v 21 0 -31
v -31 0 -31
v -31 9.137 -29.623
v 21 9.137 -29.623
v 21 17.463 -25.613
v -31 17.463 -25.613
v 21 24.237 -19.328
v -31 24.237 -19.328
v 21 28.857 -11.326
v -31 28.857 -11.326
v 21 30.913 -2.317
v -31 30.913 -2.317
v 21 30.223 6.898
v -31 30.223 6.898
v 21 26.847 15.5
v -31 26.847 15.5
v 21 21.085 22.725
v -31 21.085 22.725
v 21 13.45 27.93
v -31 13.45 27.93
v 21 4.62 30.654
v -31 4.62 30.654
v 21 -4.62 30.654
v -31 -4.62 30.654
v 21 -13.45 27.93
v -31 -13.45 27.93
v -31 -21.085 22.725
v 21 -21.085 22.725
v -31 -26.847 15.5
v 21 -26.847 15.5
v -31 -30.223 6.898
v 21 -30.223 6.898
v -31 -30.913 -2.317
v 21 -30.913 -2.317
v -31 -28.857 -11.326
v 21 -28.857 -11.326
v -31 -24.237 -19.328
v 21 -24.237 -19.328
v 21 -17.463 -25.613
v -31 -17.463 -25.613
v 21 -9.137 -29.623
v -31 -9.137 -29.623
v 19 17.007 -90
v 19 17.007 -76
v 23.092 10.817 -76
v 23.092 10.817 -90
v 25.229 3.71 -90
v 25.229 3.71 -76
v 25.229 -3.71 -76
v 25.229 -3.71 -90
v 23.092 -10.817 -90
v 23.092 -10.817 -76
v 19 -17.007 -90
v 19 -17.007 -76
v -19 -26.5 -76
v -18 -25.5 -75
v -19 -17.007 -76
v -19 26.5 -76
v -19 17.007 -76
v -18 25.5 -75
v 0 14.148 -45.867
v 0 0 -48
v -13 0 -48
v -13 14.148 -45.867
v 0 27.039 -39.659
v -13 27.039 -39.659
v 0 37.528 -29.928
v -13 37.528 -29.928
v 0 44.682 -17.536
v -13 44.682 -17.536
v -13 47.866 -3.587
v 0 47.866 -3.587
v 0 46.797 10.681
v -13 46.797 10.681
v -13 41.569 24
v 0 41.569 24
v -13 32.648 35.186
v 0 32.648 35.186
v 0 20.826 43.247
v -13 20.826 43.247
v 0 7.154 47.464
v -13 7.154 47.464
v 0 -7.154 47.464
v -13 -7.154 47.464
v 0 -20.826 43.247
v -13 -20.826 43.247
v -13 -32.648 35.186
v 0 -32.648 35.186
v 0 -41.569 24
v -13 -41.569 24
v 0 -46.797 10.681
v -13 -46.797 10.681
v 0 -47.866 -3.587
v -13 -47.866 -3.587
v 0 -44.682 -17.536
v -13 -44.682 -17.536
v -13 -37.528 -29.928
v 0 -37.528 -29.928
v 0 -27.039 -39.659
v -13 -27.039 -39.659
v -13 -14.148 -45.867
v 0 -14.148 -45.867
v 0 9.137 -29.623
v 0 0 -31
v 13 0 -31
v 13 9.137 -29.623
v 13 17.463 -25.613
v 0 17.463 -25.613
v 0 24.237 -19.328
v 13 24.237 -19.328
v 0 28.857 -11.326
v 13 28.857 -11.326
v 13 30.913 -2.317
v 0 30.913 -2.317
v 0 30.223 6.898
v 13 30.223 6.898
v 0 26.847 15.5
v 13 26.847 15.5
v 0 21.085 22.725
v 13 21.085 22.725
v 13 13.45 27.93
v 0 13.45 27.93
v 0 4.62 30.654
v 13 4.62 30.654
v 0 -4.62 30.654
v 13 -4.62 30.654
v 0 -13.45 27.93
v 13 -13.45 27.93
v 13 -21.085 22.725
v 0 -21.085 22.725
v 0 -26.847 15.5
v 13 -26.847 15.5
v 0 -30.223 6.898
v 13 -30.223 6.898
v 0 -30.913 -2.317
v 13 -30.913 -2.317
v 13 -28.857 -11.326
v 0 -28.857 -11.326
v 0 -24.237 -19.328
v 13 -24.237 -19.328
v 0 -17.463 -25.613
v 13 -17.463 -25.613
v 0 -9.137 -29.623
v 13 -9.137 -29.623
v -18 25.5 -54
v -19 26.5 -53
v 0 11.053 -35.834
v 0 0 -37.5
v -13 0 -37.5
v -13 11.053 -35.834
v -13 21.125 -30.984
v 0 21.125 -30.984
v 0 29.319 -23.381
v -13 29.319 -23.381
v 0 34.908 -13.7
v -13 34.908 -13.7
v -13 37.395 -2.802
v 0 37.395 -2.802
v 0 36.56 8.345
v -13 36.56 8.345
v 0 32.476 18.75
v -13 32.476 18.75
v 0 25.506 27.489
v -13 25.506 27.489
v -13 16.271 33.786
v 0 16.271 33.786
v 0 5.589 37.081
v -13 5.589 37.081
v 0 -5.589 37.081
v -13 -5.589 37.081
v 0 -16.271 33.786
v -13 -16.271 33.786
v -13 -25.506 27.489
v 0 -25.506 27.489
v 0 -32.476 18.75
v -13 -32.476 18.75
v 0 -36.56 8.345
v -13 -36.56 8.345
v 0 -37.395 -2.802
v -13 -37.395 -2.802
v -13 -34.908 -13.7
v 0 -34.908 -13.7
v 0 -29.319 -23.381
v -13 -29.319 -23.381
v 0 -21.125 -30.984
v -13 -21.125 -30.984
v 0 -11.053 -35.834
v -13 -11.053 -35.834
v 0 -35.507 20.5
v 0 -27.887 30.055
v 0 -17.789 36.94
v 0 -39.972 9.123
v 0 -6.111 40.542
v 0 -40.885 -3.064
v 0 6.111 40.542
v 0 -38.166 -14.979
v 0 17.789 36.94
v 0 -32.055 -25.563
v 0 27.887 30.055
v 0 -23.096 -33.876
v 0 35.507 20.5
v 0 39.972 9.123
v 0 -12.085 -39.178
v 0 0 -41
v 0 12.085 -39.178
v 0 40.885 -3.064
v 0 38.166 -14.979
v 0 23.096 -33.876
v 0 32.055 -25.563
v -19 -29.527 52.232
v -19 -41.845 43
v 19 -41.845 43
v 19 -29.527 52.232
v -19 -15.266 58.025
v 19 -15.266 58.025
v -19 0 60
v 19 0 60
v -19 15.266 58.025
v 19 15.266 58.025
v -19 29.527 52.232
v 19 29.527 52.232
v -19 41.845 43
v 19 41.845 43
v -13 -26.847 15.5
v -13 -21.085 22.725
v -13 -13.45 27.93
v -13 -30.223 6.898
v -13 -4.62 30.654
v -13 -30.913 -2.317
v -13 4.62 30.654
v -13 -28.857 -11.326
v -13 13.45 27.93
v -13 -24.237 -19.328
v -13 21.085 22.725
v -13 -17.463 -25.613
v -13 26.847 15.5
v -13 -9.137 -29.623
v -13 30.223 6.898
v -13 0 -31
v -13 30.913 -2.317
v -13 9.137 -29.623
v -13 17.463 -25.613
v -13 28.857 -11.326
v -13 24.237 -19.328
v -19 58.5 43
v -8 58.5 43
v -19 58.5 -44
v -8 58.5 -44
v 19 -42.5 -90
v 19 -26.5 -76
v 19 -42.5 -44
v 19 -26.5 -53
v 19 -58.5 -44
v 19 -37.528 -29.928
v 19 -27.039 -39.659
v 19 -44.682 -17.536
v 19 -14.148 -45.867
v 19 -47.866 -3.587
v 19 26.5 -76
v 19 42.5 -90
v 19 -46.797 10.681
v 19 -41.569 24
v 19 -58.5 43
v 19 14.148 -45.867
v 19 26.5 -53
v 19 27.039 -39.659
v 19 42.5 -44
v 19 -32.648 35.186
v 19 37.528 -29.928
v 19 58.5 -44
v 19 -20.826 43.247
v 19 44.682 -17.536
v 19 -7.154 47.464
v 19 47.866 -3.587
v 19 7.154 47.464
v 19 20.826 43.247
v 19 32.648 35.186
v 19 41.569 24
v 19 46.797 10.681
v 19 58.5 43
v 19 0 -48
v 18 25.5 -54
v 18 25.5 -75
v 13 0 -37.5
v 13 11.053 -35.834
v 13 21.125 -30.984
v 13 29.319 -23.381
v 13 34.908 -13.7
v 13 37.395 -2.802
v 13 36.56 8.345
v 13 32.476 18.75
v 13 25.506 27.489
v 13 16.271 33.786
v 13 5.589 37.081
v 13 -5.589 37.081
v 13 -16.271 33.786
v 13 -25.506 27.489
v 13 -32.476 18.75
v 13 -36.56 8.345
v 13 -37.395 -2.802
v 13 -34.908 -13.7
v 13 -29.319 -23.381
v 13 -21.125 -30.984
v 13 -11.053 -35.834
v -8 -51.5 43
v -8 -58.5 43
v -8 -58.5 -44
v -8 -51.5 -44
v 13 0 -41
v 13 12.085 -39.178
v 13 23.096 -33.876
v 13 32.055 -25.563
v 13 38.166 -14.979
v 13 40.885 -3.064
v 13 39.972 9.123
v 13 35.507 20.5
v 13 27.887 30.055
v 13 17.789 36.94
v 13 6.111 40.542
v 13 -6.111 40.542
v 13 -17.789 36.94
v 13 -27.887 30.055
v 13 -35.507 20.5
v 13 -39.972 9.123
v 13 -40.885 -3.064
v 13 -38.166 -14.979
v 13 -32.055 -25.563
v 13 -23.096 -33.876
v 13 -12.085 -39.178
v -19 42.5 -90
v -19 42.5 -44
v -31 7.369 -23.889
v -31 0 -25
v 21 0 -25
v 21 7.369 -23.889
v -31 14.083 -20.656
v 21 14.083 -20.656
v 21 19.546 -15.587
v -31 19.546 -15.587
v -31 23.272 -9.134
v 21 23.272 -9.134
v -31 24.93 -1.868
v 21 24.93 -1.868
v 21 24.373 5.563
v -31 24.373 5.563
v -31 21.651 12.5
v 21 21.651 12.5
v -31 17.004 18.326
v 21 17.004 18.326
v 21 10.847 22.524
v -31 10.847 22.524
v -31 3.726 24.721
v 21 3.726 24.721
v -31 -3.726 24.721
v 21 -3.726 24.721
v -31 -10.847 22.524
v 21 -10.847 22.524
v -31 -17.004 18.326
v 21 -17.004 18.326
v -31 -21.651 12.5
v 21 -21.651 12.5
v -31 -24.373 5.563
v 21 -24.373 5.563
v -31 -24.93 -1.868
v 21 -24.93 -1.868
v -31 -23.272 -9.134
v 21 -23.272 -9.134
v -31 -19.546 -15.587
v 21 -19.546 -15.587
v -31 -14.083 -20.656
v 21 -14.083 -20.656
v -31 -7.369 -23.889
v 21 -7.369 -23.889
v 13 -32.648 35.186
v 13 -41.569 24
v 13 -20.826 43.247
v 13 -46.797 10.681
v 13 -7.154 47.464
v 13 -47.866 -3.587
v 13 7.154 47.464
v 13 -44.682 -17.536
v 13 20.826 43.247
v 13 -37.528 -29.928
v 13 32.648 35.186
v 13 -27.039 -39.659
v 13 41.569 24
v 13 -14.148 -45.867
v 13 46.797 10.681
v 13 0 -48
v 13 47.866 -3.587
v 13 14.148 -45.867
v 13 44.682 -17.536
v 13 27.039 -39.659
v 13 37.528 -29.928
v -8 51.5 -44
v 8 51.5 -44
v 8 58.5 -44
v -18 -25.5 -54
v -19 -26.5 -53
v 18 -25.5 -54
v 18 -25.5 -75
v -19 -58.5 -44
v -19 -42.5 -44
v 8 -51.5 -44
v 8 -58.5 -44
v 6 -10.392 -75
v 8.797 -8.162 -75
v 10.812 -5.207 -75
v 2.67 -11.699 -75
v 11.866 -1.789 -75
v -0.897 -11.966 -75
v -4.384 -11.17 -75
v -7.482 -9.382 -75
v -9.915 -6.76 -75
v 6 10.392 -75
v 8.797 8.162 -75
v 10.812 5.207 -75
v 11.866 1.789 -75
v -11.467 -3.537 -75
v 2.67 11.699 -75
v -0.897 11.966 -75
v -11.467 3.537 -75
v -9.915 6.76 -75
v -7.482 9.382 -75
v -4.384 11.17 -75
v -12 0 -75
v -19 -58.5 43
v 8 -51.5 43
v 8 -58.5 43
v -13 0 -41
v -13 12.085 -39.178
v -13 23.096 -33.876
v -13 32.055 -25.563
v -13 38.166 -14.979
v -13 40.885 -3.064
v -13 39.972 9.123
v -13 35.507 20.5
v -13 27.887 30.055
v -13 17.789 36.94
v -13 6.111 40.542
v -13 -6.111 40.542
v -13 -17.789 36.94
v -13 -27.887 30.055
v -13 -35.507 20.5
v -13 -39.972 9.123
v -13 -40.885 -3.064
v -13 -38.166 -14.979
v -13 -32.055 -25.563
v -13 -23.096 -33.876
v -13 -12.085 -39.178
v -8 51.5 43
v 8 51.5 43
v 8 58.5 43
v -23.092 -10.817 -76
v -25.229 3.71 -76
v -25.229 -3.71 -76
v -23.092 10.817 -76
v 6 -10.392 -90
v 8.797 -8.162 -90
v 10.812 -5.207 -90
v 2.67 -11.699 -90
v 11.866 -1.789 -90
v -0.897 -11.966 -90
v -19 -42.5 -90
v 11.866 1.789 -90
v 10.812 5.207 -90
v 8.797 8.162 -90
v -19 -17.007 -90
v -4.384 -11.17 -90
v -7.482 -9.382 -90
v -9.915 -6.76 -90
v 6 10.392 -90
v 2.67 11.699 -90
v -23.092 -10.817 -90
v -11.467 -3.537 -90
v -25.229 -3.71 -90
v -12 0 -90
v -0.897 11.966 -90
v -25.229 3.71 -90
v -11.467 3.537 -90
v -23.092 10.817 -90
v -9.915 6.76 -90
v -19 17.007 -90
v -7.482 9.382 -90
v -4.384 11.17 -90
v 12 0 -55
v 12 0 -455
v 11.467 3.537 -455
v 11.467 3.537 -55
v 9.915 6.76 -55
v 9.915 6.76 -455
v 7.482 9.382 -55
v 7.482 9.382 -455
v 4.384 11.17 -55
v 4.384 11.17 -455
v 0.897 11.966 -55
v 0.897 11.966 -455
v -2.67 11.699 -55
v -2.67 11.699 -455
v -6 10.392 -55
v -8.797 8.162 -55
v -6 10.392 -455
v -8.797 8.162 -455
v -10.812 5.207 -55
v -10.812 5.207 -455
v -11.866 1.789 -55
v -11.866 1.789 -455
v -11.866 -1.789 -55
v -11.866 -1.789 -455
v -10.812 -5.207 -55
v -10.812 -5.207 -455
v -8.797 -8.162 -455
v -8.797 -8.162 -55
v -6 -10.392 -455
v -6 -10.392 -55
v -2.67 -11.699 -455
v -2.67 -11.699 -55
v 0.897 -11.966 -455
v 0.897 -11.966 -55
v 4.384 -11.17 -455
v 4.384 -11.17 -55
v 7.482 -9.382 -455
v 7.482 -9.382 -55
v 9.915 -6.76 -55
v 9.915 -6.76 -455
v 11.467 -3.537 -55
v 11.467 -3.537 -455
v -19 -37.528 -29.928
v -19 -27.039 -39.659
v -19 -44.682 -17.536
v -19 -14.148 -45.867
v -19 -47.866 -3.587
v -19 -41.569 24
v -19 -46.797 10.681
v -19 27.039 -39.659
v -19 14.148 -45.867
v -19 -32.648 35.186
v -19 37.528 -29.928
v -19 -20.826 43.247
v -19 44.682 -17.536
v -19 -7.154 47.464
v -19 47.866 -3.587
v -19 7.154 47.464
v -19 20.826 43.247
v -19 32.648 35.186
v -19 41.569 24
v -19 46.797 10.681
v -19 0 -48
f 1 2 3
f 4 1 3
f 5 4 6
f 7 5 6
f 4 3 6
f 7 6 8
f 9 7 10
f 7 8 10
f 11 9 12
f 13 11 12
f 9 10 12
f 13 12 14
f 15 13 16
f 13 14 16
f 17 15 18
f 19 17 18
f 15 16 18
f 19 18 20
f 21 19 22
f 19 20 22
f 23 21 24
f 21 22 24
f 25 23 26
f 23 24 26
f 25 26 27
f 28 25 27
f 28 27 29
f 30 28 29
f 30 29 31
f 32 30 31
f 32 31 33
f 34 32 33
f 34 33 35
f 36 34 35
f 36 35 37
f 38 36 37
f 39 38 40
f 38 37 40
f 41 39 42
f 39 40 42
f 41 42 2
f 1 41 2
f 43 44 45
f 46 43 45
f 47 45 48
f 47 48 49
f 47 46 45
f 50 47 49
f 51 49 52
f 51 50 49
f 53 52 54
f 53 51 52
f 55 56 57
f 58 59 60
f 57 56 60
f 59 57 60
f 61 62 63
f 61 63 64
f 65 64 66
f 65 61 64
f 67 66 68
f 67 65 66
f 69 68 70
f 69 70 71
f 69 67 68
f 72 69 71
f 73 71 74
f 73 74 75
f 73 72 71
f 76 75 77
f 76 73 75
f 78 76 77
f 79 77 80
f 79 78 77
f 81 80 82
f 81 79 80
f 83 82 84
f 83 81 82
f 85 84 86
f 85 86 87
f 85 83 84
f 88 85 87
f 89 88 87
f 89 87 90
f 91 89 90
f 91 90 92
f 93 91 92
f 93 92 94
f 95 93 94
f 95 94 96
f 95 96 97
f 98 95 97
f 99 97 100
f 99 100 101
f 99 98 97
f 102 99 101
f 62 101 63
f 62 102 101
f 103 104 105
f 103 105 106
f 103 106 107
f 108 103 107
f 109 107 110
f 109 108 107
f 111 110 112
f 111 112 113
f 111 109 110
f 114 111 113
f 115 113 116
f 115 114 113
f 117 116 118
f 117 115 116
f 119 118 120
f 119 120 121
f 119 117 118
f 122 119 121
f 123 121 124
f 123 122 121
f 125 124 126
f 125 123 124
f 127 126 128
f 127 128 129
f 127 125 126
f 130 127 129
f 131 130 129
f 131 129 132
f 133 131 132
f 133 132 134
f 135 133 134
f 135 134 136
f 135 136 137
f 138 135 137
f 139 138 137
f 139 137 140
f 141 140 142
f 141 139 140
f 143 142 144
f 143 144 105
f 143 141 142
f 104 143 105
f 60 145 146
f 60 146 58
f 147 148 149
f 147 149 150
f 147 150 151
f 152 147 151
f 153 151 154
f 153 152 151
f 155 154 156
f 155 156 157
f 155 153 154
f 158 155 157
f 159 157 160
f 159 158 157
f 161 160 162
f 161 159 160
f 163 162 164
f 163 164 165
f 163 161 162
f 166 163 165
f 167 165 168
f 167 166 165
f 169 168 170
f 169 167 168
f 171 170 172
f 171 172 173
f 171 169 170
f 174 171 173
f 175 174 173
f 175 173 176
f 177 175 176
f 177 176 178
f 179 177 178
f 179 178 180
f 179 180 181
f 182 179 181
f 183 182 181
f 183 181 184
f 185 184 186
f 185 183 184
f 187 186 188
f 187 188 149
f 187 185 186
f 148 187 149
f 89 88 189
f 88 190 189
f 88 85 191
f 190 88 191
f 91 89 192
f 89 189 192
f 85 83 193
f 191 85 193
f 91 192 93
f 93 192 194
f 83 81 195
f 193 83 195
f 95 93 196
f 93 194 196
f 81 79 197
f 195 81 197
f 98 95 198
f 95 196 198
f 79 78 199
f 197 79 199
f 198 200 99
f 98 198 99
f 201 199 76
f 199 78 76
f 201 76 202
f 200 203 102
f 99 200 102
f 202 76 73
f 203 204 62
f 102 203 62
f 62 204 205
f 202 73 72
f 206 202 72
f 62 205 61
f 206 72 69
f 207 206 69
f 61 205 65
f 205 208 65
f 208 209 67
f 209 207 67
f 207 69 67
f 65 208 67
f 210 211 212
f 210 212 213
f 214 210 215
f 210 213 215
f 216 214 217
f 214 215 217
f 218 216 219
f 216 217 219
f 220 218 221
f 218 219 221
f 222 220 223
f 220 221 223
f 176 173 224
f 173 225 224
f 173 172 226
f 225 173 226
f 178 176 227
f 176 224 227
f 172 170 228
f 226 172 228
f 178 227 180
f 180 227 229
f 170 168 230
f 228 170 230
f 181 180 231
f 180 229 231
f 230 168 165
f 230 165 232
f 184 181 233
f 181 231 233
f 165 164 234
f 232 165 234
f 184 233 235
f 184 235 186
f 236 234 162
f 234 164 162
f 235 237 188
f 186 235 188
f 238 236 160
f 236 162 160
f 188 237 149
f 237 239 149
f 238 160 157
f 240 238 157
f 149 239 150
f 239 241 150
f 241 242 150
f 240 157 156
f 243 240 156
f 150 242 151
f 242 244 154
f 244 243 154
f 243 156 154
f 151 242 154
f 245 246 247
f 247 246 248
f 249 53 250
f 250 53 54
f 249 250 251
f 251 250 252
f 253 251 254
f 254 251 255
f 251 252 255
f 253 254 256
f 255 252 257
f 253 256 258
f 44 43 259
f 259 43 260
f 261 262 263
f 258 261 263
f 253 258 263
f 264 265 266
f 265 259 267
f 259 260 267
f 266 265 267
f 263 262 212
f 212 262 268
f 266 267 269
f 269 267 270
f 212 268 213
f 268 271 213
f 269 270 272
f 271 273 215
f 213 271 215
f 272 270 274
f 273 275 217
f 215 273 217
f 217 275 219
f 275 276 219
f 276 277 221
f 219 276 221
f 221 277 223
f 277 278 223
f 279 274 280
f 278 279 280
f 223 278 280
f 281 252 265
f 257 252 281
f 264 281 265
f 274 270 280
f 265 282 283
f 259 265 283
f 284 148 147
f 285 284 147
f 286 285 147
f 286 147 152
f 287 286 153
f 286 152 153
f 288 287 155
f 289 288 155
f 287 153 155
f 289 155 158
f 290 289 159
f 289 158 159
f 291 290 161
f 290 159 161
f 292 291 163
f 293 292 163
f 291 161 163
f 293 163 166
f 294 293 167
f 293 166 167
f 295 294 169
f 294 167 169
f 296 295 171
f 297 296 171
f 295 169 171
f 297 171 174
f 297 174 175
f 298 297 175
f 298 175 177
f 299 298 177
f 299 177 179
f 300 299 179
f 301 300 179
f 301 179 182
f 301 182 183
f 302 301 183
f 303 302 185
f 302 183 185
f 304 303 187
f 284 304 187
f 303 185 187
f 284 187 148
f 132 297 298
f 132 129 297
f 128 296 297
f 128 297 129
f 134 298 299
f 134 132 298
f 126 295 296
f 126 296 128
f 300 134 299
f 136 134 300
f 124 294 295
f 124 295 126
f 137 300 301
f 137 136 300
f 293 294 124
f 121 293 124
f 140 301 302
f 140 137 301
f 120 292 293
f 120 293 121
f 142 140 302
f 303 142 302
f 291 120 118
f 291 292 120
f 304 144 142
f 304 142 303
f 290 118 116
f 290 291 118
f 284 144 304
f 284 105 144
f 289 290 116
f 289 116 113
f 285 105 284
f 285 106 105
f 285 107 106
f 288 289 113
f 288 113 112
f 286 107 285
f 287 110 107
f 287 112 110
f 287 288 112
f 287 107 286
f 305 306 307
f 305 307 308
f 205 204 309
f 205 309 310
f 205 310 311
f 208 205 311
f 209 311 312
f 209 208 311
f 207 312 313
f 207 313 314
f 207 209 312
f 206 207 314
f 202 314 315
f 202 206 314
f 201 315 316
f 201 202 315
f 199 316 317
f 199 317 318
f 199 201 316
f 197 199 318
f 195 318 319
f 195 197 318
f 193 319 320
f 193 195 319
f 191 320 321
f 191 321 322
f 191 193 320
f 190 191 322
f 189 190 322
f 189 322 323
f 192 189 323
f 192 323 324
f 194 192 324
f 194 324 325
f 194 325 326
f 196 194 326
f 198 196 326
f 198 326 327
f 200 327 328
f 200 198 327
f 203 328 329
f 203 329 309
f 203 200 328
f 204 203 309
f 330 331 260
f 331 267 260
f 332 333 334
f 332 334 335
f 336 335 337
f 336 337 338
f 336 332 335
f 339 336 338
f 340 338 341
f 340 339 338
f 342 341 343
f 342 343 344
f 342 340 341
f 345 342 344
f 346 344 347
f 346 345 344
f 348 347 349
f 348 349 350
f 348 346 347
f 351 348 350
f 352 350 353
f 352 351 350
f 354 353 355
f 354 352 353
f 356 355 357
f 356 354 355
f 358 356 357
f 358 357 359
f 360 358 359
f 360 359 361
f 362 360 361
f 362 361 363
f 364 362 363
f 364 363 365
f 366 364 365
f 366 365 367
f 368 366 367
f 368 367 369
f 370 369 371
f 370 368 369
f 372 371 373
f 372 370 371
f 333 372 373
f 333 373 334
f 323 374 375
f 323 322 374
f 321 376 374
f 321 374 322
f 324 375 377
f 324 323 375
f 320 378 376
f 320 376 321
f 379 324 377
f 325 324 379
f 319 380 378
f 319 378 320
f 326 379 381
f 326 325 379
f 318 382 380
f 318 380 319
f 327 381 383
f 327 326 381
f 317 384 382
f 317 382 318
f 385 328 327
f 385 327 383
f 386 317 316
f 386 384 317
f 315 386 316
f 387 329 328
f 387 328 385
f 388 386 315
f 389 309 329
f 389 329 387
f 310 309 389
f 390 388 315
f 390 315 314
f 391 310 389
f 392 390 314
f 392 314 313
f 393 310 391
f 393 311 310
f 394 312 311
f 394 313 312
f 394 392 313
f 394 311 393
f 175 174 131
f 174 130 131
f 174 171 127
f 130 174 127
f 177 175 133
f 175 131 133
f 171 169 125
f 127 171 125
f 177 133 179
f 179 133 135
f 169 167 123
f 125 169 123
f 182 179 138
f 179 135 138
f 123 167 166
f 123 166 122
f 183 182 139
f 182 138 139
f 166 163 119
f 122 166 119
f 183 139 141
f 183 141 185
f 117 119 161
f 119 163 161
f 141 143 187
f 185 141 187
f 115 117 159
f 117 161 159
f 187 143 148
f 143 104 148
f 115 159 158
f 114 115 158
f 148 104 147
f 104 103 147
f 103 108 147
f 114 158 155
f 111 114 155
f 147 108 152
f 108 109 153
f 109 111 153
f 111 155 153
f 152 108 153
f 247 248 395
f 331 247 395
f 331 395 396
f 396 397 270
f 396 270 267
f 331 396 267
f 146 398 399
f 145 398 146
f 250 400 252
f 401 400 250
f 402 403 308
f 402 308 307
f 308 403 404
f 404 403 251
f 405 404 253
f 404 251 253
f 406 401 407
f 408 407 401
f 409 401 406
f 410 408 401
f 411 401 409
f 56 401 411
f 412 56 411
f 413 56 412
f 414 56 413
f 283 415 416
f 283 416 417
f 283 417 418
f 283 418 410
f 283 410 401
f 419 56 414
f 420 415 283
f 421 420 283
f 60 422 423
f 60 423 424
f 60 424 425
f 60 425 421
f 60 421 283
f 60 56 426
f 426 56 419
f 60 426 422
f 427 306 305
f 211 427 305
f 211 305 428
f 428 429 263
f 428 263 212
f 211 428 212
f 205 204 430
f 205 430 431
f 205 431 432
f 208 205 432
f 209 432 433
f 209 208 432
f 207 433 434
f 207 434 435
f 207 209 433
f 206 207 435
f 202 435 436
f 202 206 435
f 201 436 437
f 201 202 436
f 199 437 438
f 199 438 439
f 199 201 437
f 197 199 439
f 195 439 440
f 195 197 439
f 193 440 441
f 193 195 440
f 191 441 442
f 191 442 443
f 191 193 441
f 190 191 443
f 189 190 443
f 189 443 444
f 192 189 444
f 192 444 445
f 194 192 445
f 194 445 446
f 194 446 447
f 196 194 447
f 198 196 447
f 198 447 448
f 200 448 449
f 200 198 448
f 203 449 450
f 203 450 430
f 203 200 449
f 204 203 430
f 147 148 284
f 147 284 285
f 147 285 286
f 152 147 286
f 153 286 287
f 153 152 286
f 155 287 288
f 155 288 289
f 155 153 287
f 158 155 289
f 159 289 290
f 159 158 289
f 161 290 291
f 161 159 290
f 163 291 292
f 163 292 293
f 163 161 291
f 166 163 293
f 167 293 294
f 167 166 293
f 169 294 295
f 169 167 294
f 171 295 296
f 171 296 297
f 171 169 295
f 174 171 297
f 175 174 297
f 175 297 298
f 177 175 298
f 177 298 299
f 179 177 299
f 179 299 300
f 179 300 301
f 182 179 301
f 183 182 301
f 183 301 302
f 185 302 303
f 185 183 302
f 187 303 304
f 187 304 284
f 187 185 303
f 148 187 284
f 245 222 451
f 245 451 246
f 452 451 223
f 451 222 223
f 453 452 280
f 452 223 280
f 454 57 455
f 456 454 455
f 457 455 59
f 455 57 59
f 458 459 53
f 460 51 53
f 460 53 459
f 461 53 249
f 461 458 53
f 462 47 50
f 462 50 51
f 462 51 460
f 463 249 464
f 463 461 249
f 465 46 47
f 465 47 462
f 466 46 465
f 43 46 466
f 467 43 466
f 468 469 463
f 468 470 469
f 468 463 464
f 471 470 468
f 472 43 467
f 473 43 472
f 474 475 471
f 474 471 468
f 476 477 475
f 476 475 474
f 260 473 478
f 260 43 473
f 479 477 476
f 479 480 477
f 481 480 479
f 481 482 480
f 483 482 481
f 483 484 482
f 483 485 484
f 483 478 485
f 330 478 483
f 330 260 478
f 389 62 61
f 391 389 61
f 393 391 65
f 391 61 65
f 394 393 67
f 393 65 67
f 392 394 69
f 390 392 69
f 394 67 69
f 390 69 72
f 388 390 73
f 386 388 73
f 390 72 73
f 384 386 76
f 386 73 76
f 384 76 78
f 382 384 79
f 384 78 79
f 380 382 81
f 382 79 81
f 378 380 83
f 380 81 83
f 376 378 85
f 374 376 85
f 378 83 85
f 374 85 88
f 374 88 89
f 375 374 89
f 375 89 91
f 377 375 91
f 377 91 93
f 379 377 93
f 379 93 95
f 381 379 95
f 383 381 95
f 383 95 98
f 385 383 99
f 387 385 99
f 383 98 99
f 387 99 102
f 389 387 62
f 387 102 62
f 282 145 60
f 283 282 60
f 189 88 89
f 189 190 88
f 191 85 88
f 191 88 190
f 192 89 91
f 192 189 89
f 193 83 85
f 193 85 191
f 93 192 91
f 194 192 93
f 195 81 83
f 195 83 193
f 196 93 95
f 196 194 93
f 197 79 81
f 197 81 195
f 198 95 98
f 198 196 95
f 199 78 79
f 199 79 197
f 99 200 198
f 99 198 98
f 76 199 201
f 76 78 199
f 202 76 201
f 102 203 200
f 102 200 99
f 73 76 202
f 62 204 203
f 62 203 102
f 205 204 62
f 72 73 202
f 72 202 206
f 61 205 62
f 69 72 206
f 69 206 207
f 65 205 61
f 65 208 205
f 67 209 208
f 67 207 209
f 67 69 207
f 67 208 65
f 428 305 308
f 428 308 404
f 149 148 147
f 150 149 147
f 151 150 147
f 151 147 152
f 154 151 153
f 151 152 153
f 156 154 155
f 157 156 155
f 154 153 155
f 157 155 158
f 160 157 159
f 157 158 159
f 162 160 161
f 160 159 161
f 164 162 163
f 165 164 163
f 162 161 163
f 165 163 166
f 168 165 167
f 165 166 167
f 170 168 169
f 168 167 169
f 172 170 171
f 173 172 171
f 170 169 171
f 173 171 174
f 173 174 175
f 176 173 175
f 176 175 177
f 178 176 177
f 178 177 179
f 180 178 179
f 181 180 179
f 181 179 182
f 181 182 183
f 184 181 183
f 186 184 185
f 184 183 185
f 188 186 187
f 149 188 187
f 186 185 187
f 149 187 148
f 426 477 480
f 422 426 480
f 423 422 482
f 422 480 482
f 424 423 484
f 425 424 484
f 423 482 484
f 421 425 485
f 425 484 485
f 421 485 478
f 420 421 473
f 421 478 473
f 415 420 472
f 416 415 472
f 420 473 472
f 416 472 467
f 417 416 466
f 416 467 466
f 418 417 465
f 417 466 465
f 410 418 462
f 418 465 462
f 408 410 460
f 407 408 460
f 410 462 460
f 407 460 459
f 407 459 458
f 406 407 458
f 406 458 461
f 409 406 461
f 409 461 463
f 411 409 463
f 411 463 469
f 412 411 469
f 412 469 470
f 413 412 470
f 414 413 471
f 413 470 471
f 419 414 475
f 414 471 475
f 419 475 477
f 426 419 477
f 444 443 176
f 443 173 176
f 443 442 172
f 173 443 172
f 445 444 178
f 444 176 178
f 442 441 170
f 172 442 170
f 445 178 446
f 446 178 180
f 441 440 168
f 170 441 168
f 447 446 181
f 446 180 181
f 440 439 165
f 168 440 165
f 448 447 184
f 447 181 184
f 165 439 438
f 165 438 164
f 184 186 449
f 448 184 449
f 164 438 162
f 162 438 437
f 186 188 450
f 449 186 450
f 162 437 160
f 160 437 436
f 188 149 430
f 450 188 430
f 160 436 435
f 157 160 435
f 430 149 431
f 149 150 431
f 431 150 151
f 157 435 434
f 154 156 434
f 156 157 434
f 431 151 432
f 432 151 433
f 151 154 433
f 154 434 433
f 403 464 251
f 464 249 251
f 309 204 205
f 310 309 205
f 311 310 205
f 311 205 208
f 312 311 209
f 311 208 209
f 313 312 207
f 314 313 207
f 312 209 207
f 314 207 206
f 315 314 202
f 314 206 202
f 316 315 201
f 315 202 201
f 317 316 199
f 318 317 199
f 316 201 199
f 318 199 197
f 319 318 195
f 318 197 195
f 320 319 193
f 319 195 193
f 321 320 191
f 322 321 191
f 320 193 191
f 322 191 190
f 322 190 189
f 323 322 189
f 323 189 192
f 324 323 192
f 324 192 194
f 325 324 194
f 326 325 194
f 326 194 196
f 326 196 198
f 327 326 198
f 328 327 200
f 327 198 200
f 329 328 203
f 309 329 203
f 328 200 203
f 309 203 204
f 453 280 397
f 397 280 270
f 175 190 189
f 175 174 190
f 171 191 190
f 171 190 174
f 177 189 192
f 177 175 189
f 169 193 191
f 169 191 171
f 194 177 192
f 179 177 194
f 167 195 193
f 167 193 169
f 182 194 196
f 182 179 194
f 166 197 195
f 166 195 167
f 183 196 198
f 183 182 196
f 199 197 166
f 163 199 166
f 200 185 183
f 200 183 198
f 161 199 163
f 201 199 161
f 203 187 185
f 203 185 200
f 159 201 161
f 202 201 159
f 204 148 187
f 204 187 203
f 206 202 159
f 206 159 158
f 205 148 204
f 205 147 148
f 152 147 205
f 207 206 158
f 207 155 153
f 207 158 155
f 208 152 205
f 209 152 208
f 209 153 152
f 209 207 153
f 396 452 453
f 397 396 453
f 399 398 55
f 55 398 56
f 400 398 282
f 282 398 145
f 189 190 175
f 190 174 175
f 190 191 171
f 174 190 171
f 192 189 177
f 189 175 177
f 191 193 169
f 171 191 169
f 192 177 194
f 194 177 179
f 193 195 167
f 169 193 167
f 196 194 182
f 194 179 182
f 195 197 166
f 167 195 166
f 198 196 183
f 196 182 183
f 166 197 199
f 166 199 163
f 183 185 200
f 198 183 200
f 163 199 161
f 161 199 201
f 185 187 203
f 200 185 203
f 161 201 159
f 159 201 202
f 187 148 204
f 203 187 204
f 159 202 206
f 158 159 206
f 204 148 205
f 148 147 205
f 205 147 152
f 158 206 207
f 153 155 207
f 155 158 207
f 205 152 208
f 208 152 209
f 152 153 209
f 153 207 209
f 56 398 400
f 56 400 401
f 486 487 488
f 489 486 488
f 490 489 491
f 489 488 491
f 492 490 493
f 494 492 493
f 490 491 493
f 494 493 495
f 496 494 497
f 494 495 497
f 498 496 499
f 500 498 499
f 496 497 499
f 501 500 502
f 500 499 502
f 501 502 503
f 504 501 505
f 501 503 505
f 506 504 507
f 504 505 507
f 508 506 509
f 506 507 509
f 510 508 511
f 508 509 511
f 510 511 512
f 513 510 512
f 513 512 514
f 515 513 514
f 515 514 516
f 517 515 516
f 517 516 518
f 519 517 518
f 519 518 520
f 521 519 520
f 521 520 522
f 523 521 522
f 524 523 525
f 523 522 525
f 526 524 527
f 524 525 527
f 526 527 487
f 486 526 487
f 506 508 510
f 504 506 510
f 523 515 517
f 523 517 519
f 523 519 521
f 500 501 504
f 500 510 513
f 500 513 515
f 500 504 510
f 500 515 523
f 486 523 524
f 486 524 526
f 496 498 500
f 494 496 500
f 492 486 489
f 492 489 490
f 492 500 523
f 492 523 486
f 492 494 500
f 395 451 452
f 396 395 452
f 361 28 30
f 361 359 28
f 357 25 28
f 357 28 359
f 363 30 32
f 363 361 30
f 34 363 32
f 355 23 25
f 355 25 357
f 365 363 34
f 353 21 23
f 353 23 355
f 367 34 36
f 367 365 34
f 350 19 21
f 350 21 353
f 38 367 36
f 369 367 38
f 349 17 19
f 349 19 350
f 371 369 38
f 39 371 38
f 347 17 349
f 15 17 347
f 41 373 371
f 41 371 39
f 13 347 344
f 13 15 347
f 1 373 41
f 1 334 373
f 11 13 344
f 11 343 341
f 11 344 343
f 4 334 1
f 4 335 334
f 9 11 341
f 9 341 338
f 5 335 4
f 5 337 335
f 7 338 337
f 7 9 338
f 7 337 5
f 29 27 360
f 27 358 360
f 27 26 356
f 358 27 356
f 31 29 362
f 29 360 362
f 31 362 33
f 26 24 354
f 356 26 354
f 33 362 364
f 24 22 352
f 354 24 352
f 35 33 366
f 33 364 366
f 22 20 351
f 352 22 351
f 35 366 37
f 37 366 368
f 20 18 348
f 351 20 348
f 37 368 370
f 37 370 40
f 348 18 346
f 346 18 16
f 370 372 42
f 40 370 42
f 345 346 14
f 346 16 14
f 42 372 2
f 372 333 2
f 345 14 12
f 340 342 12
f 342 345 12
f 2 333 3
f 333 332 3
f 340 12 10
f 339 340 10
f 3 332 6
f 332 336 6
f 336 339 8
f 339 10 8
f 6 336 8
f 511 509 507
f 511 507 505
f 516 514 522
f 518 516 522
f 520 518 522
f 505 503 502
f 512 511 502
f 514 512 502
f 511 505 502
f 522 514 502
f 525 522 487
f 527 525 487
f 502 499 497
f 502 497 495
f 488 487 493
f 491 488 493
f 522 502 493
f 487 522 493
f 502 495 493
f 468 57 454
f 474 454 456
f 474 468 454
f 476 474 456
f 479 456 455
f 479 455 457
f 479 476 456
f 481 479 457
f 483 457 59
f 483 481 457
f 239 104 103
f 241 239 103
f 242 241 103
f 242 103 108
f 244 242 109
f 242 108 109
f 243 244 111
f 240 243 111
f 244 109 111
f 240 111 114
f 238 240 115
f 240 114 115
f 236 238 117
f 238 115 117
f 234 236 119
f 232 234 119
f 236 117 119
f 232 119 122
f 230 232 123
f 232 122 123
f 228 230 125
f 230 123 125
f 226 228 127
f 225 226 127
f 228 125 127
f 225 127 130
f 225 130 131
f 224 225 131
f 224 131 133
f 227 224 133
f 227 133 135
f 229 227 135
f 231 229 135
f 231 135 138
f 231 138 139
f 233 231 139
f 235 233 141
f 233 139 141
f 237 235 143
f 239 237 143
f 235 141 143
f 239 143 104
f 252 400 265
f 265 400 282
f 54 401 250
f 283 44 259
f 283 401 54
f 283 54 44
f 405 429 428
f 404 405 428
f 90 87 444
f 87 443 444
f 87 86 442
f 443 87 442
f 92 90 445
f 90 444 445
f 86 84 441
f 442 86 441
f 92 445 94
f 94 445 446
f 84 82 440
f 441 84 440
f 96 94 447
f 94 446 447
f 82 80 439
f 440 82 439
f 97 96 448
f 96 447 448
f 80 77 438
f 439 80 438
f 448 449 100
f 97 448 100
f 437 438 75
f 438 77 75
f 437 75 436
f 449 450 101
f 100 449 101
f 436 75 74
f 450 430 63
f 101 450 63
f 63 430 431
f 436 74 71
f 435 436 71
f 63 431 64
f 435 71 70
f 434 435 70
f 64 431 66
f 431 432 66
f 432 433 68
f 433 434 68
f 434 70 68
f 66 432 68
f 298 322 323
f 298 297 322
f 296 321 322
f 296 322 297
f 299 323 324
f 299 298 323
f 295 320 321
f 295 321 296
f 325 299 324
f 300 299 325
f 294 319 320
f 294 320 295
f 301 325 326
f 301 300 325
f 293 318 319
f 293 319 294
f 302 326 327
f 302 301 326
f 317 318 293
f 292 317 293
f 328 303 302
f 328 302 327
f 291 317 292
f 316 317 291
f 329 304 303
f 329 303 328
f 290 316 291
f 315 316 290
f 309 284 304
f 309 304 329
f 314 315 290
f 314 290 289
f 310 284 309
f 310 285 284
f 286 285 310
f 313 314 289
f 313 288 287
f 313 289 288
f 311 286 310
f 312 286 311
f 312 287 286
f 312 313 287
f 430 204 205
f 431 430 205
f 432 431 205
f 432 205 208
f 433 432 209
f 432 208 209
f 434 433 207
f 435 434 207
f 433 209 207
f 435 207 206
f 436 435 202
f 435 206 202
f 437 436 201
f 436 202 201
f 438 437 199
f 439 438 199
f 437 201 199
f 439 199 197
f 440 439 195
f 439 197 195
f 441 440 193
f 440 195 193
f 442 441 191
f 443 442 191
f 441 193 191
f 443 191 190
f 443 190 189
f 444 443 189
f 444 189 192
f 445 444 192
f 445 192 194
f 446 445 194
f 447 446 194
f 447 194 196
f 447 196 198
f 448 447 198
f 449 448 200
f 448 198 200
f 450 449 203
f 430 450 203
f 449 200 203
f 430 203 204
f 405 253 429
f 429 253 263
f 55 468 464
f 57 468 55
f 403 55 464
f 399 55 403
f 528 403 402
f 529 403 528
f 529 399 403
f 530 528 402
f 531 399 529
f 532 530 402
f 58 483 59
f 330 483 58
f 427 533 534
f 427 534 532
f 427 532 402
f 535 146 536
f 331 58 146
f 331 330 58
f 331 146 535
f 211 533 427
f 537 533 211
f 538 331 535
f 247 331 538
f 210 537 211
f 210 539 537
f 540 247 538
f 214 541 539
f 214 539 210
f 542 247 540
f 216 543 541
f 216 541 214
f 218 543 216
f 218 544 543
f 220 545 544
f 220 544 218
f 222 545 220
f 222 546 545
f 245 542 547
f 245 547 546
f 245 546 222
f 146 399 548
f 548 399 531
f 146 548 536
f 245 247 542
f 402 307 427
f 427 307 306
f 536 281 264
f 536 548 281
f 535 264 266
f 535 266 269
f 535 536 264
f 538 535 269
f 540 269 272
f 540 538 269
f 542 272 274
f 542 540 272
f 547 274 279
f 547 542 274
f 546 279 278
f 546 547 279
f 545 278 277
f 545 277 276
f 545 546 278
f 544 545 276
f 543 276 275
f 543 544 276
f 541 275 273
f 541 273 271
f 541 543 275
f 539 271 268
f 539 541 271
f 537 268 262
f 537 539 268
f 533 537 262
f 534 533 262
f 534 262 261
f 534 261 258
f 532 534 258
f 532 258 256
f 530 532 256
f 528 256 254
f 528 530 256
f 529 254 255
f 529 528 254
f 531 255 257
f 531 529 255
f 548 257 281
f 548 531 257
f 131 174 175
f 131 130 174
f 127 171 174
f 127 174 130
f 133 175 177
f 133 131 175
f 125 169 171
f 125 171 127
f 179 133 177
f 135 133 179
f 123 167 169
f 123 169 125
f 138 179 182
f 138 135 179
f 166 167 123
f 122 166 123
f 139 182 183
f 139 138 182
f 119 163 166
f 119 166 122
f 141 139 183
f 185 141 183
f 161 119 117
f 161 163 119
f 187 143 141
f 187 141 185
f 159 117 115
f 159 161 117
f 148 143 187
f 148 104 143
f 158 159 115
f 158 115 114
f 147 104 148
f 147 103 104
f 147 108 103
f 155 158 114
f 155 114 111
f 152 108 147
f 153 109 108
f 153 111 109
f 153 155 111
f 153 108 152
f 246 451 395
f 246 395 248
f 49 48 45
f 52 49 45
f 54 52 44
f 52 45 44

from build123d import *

# Parameters (mm, degrees)
SKETCH1_R                = 48
BOSS_EXTRUDE1_DEPTH      = 19
SKETCH2_R                = 41
SKETCH2_R_2              = 37.5
BOSS_EXTRUDE2_DEPTH      = 13
CUT_EXTRUDE1_DEPTH       = 110.010320612
CUT_EXTRUDE1_DEPTH_BACK  = 110.010320612
SKETCH3_W                = 21
SKETCH3_H                = 51
CHAMFER1_SIZE            = 1
SKETCH4_R                = 25.5
BOSS_EXTRUDE3_DEPTH      = 14
SKETCH5_R                = 12
CUT_EXTRUDE2_DEPTH       = 15
SKETCH6_R                = 48
SKETCH6_R_2              = 41
BOSS_EXTRUDE4_DEPTH      = 13
SKETCH7_R                = 37.5
SKETCH7_R_2              = 31
BOSS_EXTRUDE5_DEPTH      = 13
BOSS_EXTRUDE6_DEPTH      = 21
BOSS_EXTRUDE6_DEPTH_BACK = 31
SKETCH8_R                = 31
SKETCH8_R_2              = 25
CUT_EXTRUDE3_DEPTH       = 112.728465487
CUT_EXTRUDE3_DEPTH_BACK  = 112.728465487
SKETCH9_W                = 16
SKETCH9_H                = 7
BOSS_EXTRUDE7_DEPTH      = 20
BOSS_EXTRUDE7_DEPTH_BACK = 380
SKETCH10_R               = 12


with BuildPart() as part:
    # Sketch1 → Boss-Extrude1 (new, symmetric)
    with BuildSketch(Plane(origin=(0, 0, 0), x_dir=(0, 0, -1), z_dir=(1, 0, 0))):
        with BuildLine():
            Line((-43, 41.844951906), (-43, 58.5))
            Line((-43, 58.5), (44, 58.5))
            Line((44, 58.5), (44, 42.5))
            Line((44, 42.5), (90, 42.5))
            Line((90, 42.5), (90, -42.5))
            Line((90, -42.5), (44, -42.5))
            Line((44, -42.5), (44, -58.5))
            Line((44, -58.5), (-43, -58.5))
            Line((-43, -58.5), (-43, -41.844951906))
            ThreePointArc((-43, -41.844951906), (-60, 0), (-43, 41.844951906))
        make_face()
        Circle(SKETCH1_R, mode=Mode.SUBTRACT)
    extrude(amount=BOSS_EXTRUDE1_DEPTH, both=True)

    # Sketch3 → Cut-Extrude1 (cut, two sides: drawn at the far end of the back side and taken through both)
    with BuildSketch(Plane(origin=(0, 0, 0), x_dir=(0, 0, -1), z_dir=(1, 0, 0)).offset(-CUT_EXTRUDE1_DEPTH_BACK)):
        with Locations((64.5, 0)):
            Rectangle(SKETCH3_W, SKETCH3_H)
    extrude(amount=CUT_EXTRUDE1_DEPTH + CUT_EXTRUDE1_DEPTH_BACK, mode=Mode.SUBTRACT)

    # Chamfer1
    chamfer1_edges = [part.edges().sort_by_distance(p)[0] for p in [
        (-19, 0, -54),
        (-19, 25.5, -64.5),
        (-19, 0, -75),
        (-19, -25.5, -64.5),
        (19, 0, -54),
        (19, -25.5, -64.5),
        (19, 0, -75),
        (19, 25.5, -64.5),
    ]]
    chamfer(chamfer1_edges, length=CHAMFER1_SIZE)

    # Sketch4 → Boss-Extrude3 (add)
    with BuildSketch(Plane(origin=(0, 0, -90), x_dir=(-1, 0, 0), z_dir=(0, 0, -1))):
        Circle(SKETCH4_R)
    extrude(amount=-BOSS_EXTRUDE3_DEPTH)

    # Sketch5 → Cut-Extrude2 (cut)
    with BuildSketch(Plane(origin=(0, 0, -90), x_dir=(-1, 0, 0), z_dir=(0, 0, -1))):
        Circle(SKETCH5_R)
    extrude(amount=-CUT_EXTRUDE2_DEPTH, mode=Mode.SUBTRACT)

    # Sketch9 → Cut-Extrude3 (cut, two sides: drawn at the far end of the back side and taken through both)
    with BuildSketch(Plane.XY.offset(-CUT_EXTRUDE3_DEPTH_BACK)):
        with Locations((0, -55)):
            Rectangle(SKETCH9_W, SKETCH9_H)
        with Locations((0, 55)):
            Rectangle(SKETCH9_W, SKETCH9_H)
    extrude(amount=CUT_EXTRUDE3_DEPTH + CUT_EXTRUDE3_DEPTH_BACK, mode=Mode.SUBTRACT)


with BuildPart() as body_2:
    # Sketch2 → Boss-Extrude2 (new body)
    with BuildSketch(Plane(origin=(0, 0, 0), x_dir=(0, 0, -1), z_dir=(1, 0, 0))):
        Circle(SKETCH2_R)
        Circle(SKETCH2_R_2, mode=Mode.SUBTRACT)
    extrude(amount=BOSS_EXTRUDE2_DEPTH)


with BuildPart() as body_3:
    # Sketch6 → Boss-Extrude4 (new body)
    with BuildSketch(Plane(origin=(0, 0, 0), x_dir=(0, 0, -1), z_dir=(1, 0, 0))):
        Circle(SKETCH6_R)
        Circle(SKETCH6_R_2, mode=Mode.SUBTRACT)
    extrude(amount=BOSS_EXTRUDE4_DEPTH)


with BuildPart() as body_4:
    # Sketch7 → Boss-Extrude5 (new body)
    with BuildSketch(Plane(origin=(0, 0, 0), x_dir=(0, 0, -1), z_dir=(1, 0, 0))):
        Circle(SKETCH7_R)
        Circle(SKETCH7_R_2, mode=Mode.SUBTRACT)
    extrude(amount=BOSS_EXTRUDE5_DEPTH)


with BuildPart() as body_5:
    # Sketch8 → Boss-Extrude6 (new, two sides: drawn at the far end of the back side and taken through both)
    with BuildSketch(Plane(origin=(0, 0, 0), x_dir=(0, 0, -1), z_dir=(1, 0, 0)).offset(-BOSS_EXTRUDE6_DEPTH_BACK)):
        Circle(SKETCH8_R)
        Circle(SKETCH8_R_2, mode=Mode.SUBTRACT)
    extrude(amount=BOSS_EXTRUDE6_DEPTH + BOSS_EXTRUDE6_DEPTH_BACK)


with BuildPart() as body_6:
    # Mirror1: mirrored copy
    add(body_3.part.mirror(Plane(origin=(0, 0, 0), x_dir=(0, 0, 1), z_dir=(1, 0, 0))))


with BuildPart() as body_7:
    # Mirror1 2: mirrored copy
    add(body_2.part.mirror(Plane(origin=(0, 0, 0), x_dir=(0, 0, 1), z_dir=(1, 0, 0))))


with BuildPart() as body_8:
    # Mirror1 3: mirrored copy
    add(body_4.part.mirror(Plane(origin=(0, 0, 0), x_dir=(0, 0, 1), z_dir=(1, 0, 0))))


with BuildPart() as body_9:
    # Sketch10 → Boss-Extrude7 (new, two sides: drawn at the far end of the back side and taken through both)
    with BuildSketch(Plane.XY.offset(-75).offset(-BOSS_EXTRUDE7_DEPTH_BACK)):
        Circle(SKETCH10_R)
    extrude(amount=BOSS_EXTRUDE7_DEPTH + BOSS_EXTRUDE7_DEPTH_BACK)


solid = Compound([part.part, body_2.part, body_3.part, body_4.part, body_5.part, body_6.part, body_7.part, body_8.part, body_9.part])
